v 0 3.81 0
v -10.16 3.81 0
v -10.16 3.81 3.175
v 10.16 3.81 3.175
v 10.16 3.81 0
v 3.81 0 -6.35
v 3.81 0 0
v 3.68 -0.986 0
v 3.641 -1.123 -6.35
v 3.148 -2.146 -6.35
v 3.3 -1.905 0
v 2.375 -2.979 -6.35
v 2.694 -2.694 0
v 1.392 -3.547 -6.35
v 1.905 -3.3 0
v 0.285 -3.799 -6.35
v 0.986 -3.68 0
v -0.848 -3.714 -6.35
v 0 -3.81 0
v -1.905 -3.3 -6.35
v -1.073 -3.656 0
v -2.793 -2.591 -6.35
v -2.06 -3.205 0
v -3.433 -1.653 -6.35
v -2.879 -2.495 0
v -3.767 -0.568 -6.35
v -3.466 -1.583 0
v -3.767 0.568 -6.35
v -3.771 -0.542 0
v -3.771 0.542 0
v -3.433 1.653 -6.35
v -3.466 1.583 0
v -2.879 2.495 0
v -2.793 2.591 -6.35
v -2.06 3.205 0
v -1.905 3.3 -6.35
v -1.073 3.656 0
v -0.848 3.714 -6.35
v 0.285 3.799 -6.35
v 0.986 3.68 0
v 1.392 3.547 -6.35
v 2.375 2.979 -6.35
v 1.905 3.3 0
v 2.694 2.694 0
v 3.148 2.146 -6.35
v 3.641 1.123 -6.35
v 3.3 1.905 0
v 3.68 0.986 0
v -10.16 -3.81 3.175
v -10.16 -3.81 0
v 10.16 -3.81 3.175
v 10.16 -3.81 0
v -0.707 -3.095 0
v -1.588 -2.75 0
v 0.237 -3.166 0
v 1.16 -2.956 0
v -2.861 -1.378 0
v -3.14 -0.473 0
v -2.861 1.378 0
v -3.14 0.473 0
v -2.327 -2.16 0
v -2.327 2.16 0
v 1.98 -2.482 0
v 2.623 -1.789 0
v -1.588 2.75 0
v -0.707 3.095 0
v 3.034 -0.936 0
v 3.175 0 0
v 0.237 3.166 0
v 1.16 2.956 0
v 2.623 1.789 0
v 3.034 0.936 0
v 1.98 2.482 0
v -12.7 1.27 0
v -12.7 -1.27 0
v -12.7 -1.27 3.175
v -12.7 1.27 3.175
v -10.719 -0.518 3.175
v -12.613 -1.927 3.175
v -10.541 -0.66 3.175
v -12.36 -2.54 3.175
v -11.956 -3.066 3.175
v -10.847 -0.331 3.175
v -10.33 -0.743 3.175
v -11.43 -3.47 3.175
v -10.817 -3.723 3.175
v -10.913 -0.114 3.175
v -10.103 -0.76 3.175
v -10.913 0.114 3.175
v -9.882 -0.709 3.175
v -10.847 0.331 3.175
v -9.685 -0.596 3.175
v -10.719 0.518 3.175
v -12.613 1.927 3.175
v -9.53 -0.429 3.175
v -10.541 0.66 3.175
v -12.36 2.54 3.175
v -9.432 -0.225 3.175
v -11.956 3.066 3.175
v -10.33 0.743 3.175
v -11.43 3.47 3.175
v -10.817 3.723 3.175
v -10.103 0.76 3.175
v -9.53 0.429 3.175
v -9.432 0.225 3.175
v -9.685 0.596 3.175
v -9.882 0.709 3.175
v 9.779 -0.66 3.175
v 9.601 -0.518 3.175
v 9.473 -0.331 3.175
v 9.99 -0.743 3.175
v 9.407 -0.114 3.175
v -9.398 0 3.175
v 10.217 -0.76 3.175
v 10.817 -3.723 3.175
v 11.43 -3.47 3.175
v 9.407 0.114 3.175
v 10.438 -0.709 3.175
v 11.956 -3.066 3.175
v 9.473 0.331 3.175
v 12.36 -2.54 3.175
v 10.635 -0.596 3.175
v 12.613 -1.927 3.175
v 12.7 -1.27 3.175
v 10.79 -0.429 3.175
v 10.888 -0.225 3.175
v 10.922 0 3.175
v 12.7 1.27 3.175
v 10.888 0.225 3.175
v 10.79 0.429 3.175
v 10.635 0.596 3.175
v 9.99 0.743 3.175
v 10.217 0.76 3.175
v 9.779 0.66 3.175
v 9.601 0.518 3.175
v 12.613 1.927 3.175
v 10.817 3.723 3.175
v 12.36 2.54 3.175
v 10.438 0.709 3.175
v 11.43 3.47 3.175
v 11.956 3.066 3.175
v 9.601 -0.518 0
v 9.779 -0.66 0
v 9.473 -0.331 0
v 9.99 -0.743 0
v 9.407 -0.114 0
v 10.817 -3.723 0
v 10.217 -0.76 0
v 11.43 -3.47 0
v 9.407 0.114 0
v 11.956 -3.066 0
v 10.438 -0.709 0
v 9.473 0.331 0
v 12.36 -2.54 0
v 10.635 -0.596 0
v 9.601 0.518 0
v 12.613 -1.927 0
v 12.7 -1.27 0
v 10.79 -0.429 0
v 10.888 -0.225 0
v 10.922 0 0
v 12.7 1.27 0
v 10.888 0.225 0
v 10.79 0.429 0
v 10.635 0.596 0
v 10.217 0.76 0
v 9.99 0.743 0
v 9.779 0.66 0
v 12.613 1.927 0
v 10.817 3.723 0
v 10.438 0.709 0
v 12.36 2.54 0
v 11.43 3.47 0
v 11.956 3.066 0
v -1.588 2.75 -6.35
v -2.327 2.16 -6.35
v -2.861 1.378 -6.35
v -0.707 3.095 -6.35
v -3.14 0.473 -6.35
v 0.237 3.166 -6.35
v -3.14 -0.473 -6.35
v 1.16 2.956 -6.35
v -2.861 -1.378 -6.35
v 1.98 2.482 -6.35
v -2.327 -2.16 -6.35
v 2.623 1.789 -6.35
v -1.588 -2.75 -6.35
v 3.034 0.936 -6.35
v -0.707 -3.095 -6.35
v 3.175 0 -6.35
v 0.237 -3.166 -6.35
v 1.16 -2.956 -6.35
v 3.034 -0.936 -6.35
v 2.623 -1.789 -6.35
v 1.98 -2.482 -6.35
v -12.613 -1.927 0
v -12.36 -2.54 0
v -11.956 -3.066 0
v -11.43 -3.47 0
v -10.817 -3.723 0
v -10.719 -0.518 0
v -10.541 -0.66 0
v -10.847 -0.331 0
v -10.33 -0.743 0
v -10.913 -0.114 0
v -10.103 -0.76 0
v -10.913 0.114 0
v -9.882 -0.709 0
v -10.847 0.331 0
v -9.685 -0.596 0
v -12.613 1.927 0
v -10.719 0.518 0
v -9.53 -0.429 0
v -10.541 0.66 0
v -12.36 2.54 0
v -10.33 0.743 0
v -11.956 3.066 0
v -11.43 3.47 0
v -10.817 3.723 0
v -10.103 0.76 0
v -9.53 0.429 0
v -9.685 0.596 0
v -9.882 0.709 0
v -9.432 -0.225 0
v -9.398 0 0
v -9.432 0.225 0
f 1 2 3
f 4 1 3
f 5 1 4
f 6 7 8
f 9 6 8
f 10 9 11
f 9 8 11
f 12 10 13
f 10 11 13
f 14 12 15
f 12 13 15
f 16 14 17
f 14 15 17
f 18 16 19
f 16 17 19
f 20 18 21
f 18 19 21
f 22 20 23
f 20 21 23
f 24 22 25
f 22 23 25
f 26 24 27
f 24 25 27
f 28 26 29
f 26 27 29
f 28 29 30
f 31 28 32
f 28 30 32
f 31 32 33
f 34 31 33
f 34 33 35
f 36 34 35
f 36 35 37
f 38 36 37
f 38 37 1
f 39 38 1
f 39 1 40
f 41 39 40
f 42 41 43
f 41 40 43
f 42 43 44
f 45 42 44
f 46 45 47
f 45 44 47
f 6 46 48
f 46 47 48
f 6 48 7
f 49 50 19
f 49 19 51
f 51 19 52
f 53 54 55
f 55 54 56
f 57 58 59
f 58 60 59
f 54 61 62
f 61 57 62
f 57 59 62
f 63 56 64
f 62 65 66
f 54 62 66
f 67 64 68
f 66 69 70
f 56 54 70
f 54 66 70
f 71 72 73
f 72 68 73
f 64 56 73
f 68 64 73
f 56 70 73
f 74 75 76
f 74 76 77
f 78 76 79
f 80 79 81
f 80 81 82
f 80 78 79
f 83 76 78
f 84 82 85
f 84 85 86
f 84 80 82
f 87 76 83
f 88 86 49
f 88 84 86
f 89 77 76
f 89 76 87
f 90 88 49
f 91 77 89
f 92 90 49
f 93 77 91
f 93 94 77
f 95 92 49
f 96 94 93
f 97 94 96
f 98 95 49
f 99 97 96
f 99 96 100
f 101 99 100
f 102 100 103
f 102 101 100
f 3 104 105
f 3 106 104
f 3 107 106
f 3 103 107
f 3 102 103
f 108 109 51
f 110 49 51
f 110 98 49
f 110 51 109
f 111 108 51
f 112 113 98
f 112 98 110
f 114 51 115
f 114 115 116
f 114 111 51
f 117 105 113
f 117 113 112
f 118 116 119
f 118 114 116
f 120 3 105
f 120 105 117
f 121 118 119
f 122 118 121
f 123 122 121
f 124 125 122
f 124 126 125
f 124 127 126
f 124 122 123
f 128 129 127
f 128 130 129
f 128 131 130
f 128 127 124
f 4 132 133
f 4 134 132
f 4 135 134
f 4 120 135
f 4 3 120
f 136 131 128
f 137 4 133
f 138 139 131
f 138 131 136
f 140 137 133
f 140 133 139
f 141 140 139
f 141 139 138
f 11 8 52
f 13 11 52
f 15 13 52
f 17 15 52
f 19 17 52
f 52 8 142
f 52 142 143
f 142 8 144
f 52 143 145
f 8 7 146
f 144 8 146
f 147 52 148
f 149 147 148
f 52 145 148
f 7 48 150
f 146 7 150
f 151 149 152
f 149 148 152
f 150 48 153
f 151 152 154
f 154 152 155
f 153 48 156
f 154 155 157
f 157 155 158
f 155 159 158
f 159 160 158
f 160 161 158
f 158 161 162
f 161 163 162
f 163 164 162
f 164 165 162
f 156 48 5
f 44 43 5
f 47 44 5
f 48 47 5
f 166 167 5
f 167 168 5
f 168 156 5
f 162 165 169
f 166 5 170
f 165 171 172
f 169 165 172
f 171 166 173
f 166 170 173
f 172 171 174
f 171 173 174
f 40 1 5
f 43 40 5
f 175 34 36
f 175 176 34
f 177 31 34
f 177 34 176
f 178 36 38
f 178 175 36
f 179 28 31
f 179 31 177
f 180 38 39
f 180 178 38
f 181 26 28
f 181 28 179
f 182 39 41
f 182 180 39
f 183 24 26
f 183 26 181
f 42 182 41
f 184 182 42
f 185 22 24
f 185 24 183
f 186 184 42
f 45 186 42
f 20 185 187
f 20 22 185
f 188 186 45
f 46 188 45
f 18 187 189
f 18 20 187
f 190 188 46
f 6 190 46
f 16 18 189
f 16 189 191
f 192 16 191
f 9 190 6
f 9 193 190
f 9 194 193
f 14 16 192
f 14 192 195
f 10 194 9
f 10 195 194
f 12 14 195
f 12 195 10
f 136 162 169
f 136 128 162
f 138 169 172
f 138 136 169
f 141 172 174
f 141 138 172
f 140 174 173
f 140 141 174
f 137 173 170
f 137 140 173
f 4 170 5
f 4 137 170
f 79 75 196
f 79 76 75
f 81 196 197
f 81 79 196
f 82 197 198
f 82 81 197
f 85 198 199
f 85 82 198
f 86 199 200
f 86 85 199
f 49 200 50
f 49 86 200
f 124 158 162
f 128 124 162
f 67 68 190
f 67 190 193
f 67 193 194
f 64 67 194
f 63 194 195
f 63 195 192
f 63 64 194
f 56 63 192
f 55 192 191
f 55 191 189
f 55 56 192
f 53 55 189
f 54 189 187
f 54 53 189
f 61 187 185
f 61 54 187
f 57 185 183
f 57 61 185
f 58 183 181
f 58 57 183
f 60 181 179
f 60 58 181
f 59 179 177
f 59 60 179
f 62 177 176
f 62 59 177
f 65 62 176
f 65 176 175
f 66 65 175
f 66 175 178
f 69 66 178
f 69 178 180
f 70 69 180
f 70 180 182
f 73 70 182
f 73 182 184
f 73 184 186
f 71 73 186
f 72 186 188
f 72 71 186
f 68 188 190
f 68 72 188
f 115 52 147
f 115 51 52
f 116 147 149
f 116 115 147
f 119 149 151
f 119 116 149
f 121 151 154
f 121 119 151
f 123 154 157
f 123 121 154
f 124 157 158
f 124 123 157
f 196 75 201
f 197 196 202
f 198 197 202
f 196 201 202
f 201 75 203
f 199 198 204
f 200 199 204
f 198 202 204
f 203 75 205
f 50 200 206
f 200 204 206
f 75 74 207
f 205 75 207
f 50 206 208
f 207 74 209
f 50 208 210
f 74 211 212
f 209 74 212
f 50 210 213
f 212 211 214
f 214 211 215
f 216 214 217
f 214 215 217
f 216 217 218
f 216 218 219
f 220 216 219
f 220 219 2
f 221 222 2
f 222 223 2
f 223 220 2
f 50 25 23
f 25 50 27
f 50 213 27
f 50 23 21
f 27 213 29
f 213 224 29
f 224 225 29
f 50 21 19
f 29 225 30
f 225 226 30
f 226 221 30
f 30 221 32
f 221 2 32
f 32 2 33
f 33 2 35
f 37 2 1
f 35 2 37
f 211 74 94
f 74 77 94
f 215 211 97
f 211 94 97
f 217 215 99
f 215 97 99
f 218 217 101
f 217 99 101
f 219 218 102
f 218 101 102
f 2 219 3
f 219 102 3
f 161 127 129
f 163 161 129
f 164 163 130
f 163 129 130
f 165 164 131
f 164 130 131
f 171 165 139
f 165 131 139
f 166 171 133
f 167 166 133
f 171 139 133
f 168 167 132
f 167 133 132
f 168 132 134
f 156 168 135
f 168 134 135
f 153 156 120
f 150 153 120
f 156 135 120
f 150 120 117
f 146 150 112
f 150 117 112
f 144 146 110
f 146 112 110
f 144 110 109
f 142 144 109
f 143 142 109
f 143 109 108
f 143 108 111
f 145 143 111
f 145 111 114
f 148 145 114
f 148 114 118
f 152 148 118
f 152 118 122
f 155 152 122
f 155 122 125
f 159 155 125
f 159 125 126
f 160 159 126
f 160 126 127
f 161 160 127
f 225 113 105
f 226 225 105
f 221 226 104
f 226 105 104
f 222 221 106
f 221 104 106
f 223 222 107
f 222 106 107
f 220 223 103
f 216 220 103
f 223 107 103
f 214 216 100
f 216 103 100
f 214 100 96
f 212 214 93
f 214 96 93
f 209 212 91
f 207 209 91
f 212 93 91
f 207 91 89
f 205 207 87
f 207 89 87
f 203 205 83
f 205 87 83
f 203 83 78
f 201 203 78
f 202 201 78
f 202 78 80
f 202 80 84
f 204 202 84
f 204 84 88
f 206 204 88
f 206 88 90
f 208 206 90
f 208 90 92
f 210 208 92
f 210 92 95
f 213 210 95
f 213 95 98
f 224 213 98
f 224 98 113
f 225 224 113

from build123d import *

# Parameters (mm, degrees)
F0_W     = 25.4
F0_H     = 7.62
F1_DEPTH = 3.175
F2_R     = 2.54
F3_R     = 3.81
F3_R_2   = 3.175
F4_DEPTH = 6.35
F5_R     = 0.762
F6_DEPTH = 9.526


with BuildPart() as f1:
    # F0 (on Top) → F1 (new body)
    with BuildSketch(Plane.XY):
        Rectangle(F0_W, F0_H)
    extrude(amount=F1_DEPTH)

    # F2
    f2_edges = [f1.edges().sort_by_distance(p)[0] for p in [
        (-12.7, -3.81, 1.5875),
        (12.7, -3.81, 1.5875),
        (12.7, 3.81, 1.5875),
        (-12.7, 3.81, 1.5875),
    ]]
    fillet(f2_edges, radius=F2_R)

    # F3 (on face) → F4 (join)
    with BuildSketch(Plane(origin=(0, 0, 0), x_dir=(1, 0, 0), z_dir=(0, 0, -1))):
        Circle(F3_R)
        Circle(F3_R_2, mode=Mode.SUBTRACT)
    extrude(amount=F4_DEPTH)

    # F5 (on face) → F6 (cut, through all)
    with BuildSketch(Plane.XY.offset(3.175)):
        with Locations((-10.16, 0)):
            Circle(F5_R)
        with Locations((10.16, 0)):
            Circle(F5_R)
    extrude(amount=-F6_DEPTH, mode=Mode.SUBTRACT)


solid = f1.part
